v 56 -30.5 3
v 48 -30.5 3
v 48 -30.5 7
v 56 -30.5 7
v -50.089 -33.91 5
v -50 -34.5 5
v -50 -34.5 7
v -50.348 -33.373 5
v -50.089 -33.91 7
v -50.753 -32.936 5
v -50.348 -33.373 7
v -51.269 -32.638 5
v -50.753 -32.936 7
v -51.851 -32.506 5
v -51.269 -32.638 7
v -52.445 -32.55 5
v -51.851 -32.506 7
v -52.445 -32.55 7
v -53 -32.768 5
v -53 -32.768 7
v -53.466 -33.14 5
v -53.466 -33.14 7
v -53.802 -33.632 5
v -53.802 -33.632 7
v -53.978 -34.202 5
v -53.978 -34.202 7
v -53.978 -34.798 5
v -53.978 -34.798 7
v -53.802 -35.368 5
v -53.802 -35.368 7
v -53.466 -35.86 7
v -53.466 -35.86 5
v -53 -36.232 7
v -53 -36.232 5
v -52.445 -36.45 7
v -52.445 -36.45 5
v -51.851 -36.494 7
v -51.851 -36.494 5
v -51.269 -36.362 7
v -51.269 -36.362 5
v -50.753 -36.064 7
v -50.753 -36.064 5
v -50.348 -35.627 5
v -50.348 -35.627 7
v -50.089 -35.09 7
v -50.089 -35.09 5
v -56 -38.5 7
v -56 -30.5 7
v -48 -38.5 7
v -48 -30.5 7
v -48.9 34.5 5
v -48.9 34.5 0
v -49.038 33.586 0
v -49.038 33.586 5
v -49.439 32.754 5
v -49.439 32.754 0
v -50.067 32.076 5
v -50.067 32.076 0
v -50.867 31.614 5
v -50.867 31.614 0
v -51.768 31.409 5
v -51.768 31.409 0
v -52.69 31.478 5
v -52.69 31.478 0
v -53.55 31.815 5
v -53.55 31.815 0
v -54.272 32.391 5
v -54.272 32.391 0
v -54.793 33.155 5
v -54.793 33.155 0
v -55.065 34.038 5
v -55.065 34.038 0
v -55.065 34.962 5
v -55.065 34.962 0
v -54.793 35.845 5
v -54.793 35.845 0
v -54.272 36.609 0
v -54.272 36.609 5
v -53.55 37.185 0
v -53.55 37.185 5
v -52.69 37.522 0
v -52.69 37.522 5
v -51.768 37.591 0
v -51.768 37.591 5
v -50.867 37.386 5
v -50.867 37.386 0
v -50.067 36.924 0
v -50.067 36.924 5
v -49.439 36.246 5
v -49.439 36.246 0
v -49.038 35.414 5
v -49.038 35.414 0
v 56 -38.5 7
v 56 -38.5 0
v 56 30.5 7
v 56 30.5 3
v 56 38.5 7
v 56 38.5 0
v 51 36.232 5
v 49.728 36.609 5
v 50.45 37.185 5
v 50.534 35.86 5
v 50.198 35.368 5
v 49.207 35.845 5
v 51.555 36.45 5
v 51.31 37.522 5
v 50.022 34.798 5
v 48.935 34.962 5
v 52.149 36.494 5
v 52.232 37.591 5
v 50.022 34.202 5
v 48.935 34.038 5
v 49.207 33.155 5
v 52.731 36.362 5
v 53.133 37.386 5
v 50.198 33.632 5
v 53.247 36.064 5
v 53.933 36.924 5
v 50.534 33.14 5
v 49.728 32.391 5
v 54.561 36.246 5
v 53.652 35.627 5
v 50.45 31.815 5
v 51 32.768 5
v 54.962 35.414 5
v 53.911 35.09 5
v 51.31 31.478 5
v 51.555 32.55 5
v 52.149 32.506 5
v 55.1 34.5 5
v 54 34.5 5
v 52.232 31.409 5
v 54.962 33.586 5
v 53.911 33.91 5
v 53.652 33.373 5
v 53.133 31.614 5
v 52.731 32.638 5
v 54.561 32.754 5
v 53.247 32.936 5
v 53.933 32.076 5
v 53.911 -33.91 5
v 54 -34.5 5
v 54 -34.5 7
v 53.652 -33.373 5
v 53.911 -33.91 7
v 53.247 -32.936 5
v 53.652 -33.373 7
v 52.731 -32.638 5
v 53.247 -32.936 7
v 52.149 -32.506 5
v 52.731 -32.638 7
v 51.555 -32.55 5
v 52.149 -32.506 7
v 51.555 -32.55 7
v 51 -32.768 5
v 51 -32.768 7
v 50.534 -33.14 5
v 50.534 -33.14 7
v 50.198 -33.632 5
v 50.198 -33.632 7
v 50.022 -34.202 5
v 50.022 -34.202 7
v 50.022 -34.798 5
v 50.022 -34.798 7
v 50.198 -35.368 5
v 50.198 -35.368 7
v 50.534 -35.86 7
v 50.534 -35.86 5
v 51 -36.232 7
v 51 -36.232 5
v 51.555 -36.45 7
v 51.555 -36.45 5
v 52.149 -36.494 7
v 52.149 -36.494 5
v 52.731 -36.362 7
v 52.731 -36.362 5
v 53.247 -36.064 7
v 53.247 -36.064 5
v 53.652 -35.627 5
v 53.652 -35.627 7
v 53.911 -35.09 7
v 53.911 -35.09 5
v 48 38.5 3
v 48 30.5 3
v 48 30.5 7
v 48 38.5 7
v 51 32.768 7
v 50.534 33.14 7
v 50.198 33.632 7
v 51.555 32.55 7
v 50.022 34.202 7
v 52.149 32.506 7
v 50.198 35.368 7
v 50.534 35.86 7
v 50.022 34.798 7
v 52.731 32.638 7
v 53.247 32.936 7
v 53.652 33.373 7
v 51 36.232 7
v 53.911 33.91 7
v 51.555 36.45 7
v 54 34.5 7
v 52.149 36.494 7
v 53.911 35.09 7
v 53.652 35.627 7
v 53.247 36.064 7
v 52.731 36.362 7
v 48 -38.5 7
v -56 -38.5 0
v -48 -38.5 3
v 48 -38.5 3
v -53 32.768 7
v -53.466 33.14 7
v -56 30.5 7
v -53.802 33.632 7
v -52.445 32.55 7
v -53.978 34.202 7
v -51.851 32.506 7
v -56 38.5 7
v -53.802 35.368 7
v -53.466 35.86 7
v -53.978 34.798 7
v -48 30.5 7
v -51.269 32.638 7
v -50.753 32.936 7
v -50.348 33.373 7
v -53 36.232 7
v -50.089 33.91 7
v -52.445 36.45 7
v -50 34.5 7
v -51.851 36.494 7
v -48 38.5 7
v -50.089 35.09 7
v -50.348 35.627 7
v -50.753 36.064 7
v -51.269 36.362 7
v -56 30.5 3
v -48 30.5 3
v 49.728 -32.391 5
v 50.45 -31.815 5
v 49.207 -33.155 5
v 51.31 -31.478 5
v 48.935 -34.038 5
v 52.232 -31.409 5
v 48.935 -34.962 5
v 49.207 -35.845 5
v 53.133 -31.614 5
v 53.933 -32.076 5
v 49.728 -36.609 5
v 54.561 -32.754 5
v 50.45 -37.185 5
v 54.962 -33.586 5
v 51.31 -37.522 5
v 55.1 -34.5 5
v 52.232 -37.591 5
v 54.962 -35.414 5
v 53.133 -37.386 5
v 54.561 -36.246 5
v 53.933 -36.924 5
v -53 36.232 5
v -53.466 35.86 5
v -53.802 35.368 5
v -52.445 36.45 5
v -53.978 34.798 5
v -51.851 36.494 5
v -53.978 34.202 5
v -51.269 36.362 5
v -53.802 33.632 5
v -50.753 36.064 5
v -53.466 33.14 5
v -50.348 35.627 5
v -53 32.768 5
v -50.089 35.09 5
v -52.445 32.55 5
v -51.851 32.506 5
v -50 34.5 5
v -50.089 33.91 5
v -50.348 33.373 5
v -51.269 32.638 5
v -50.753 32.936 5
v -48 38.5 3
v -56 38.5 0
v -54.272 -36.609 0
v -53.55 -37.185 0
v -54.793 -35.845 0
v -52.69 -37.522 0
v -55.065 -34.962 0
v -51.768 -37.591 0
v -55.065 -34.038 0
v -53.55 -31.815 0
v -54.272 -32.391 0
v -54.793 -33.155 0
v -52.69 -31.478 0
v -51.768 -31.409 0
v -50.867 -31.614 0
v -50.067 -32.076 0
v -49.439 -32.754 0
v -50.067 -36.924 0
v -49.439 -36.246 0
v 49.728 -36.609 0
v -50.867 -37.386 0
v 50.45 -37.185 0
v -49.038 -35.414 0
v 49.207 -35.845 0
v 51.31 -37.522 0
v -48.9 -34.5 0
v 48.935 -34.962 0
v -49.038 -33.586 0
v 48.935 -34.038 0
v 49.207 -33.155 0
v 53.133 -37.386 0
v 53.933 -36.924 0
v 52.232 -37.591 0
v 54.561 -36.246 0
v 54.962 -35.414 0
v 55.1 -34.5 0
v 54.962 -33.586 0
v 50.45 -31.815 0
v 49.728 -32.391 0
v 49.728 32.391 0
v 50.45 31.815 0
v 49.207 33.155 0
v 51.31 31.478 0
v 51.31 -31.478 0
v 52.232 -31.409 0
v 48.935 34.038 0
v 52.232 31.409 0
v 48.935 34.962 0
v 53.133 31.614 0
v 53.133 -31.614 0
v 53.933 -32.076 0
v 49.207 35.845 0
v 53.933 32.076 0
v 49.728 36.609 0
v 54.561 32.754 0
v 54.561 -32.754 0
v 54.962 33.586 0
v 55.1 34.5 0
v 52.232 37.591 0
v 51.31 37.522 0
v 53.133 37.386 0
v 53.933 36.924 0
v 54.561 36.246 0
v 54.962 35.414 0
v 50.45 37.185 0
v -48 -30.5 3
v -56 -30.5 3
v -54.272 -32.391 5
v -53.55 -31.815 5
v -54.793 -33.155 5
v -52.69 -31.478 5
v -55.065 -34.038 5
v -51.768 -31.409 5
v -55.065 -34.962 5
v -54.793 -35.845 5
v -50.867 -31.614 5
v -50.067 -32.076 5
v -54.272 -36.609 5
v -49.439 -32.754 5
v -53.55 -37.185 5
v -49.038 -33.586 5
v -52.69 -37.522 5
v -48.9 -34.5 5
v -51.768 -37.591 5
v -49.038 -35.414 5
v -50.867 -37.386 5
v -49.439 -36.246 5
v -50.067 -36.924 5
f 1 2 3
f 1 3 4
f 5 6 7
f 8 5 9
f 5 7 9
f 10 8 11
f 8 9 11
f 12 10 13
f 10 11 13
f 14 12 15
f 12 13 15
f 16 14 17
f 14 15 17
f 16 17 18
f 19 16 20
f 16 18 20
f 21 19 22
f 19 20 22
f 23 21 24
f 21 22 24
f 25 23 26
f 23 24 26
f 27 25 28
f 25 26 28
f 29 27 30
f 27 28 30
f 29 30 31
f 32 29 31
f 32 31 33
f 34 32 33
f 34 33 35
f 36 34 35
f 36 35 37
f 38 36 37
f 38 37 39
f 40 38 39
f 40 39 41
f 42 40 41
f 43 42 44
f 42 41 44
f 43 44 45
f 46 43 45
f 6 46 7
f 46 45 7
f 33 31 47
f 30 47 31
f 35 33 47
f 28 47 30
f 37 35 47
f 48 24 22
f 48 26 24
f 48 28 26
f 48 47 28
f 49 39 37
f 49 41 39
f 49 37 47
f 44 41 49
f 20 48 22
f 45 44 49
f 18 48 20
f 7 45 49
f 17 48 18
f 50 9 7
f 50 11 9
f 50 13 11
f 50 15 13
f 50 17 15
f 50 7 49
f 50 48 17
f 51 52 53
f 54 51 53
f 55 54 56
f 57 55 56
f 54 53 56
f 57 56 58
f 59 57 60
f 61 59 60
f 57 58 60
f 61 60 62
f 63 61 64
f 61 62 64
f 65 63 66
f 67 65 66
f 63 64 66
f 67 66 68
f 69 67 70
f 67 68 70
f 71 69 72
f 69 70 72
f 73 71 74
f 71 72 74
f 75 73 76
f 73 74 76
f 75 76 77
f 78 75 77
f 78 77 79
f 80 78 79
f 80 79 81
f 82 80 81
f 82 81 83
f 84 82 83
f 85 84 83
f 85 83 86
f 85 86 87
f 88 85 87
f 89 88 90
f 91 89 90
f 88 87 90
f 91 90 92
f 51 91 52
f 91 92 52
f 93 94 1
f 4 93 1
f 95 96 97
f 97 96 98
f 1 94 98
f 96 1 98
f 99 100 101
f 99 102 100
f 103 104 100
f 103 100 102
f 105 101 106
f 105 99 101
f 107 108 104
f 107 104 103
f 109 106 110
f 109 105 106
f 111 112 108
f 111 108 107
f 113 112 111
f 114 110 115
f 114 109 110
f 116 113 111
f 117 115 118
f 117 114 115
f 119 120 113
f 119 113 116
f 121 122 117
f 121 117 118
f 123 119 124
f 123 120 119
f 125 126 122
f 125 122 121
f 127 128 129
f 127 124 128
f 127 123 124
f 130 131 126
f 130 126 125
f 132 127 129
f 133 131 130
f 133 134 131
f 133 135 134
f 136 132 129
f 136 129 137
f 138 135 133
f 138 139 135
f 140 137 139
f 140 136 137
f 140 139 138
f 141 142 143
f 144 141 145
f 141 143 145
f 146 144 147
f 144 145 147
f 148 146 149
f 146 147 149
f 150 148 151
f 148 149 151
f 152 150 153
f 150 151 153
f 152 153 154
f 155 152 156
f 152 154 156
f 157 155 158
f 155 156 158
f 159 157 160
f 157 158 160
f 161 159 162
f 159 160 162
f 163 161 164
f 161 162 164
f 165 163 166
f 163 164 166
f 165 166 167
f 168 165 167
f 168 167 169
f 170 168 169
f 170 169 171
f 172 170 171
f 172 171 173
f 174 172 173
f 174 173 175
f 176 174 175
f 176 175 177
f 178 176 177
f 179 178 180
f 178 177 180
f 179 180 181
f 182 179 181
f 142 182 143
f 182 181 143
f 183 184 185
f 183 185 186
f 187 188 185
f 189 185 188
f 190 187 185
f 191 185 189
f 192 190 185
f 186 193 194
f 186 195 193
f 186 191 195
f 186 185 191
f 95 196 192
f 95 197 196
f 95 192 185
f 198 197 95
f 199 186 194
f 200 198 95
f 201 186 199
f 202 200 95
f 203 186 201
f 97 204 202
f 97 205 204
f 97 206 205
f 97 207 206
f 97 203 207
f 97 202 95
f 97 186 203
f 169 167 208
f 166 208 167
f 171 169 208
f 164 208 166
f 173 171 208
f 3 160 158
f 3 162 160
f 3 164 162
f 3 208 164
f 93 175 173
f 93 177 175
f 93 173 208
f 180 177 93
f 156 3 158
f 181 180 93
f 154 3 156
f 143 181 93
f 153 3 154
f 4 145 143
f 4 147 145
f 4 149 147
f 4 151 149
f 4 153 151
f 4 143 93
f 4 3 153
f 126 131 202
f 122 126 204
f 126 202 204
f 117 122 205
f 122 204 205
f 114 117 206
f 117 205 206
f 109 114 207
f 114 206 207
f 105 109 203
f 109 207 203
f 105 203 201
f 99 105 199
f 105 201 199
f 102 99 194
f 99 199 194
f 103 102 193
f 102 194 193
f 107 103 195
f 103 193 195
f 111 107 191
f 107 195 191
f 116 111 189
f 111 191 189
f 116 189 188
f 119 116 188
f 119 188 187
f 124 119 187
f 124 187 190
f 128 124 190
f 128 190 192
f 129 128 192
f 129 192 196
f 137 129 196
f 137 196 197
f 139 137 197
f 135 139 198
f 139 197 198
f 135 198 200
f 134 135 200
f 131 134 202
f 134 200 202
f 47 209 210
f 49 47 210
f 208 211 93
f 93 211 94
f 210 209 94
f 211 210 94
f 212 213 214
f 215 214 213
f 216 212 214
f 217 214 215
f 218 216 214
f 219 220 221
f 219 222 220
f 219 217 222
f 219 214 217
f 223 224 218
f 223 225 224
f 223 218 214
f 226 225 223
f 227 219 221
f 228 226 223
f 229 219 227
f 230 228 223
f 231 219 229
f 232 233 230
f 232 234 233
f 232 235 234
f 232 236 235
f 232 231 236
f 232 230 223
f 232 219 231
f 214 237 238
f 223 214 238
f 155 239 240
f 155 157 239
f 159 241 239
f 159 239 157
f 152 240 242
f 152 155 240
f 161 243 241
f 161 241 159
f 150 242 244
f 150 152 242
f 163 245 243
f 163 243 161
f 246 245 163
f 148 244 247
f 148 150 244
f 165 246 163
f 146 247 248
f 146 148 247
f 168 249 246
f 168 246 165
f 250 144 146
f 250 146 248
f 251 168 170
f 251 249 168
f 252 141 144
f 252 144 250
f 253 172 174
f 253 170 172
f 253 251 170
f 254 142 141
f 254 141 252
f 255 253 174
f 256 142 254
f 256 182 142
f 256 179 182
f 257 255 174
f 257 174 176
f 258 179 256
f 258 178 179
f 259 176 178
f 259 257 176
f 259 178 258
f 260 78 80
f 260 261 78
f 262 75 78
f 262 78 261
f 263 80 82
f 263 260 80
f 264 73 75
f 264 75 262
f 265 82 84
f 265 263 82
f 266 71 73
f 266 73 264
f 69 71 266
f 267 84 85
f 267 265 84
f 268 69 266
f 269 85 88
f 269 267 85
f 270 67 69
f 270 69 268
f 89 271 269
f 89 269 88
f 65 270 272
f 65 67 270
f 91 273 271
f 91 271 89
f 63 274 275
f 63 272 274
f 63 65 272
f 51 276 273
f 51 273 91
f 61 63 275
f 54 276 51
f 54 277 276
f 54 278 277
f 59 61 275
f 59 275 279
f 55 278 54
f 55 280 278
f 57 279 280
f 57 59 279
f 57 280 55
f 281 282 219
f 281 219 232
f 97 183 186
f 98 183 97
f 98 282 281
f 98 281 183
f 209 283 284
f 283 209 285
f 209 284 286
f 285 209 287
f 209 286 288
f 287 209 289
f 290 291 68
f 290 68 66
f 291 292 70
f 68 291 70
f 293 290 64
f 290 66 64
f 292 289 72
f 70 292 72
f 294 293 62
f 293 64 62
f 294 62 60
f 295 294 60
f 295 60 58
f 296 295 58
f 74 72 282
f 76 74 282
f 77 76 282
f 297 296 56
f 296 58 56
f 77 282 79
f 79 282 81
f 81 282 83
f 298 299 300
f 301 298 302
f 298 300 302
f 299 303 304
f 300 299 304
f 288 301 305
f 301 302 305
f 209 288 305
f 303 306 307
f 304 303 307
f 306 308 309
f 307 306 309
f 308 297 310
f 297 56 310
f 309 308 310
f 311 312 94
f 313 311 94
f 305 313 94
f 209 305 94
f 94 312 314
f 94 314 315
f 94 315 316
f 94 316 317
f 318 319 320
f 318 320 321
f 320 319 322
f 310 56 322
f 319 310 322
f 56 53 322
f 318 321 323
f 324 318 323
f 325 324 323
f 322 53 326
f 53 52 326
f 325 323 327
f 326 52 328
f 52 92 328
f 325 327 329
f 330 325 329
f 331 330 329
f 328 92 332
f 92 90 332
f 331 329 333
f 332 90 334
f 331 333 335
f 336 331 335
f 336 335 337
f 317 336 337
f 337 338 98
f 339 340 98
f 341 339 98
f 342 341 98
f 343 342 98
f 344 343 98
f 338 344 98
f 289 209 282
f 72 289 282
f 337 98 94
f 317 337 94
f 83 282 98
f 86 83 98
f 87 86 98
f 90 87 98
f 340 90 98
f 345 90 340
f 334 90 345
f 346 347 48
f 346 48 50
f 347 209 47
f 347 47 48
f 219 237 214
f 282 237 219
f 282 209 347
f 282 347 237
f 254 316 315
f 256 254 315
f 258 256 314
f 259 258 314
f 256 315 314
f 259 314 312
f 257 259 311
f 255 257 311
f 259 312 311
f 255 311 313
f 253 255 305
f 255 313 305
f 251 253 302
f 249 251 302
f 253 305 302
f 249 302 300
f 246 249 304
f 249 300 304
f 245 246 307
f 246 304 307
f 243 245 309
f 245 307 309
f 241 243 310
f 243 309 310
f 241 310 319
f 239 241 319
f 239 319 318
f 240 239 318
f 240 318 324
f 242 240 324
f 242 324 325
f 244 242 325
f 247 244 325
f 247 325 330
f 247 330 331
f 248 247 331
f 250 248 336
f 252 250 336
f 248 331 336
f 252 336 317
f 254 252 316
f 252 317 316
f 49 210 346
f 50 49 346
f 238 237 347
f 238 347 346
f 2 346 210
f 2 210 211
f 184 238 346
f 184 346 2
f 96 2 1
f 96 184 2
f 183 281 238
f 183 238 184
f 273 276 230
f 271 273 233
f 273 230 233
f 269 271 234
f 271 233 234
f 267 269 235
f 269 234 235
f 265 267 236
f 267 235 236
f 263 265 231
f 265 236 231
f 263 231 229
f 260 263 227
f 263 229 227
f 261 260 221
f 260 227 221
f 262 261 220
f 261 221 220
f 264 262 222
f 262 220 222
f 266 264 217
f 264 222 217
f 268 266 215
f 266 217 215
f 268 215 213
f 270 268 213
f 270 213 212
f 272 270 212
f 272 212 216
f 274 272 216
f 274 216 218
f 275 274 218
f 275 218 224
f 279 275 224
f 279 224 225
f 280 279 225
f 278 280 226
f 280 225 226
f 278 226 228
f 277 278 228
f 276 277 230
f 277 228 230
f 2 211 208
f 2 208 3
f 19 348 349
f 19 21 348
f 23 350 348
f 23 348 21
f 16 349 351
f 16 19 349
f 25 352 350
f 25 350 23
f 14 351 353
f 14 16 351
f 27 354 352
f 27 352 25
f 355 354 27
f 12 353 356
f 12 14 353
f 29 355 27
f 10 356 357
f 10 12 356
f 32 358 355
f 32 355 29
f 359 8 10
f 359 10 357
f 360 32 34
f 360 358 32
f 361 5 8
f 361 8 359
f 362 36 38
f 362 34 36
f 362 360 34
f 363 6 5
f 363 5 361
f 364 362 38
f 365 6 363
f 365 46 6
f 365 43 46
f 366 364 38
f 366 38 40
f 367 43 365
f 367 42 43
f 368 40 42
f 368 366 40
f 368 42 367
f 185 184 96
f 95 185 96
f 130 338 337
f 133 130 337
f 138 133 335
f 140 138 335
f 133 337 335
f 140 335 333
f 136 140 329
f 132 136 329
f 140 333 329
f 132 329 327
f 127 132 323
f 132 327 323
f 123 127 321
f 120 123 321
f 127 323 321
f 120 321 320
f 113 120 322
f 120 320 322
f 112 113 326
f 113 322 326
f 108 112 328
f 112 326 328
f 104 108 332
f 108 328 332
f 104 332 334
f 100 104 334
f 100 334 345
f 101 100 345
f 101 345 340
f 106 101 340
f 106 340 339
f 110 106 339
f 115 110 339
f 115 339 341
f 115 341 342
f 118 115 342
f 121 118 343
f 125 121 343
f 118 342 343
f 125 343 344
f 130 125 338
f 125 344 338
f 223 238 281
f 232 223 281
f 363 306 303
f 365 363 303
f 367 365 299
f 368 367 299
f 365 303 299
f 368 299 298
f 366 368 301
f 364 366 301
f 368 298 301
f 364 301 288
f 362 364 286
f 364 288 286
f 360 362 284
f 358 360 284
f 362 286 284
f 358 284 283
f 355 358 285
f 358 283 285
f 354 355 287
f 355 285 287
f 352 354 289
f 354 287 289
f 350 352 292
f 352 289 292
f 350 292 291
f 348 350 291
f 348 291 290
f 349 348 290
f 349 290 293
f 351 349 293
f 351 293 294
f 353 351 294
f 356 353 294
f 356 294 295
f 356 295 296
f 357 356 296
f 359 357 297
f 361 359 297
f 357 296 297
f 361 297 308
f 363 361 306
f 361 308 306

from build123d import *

# Parameters (mm, degrees)
F0_W     = 112
F0_H     = 77
F1_DEPTH = 3
F2_W     = 8
F2_H     = 8
F3_DEPTH = 4
F4_R     = 2
F5_DEPTH = 25.4
F6_R     = 3.1
F6_R_2   = 2
F7_DEPTH = 5


with BuildPart() as f1:
    # F0 (on Top) → F1 (new body)
    with BuildSketch(Plane.XY):
        Rectangle(F0_W, F0_H)
    extrude(amount=F1_DEPTH)

    # F2 (on face) → F3 (join)
    with BuildSketch(Plane.XY.offset(3)):
        with Locations((-52, 34.5)):
            Rectangle(F2_W, F2_H)
        with Locations((-52, -34.5)):
            Rectangle(F2_W, F2_H)
        with Locations((52, -34.5)):
            Rectangle(F2_W, F2_H)
        with Locations((52, 34.5)):
            Rectangle(F2_W, F2_H)
    extrude(amount=F3_DEPTH)

    # F4 (on face) → F5 (cut)
    with BuildSketch(Plane.XY.offset(7)):
        with Locations((-52, 34.5)):
            Circle(F4_R)
        with Locations((52, 34.5)):
            Circle(F4_R)
        with Locations((-52, -34.5)):
            Circle(F4_R)
        with Locations((52, -34.5)):
            Circle(F4_R)
    extrude(amount=-F5_DEPTH, mode=Mode.SUBTRACT)

    # F6 (on face) → F7 (cut)
    with BuildSketch(Plane(origin=(0, 0, 0), x_dir=(1, 0, 0), z_dir=(0, 0, -1))):
        with Locations((-52, 34.5)):
            Circle(F6_R)
        with Locations((-52, 34.5)):
            Circle(F6_R_2, mode=Mode.SUBTRACT)
        with Locations((52, 34.5)):
            Circle(F6_R)
        with Locations((52, 34.5)):
            Circle(F6_R_2, mode=Mode.SUBTRACT)
        with Locations((52, -34.5)):
            Circle(F6_R)
        with Locations((52, -34.5)):
            Circle(F6_R_2, mode=Mode.SUBTRACT)
        with Locations((-52, -34.5)):
            Circle(F6_R)
        with Locations((-52, -34.5)):
            Circle(F6_R_2, mode=Mode.SUBTRACT)
    extrude(amount=-F7_DEPTH, mode=Mode.SUBTRACT)


solid = f1.part
